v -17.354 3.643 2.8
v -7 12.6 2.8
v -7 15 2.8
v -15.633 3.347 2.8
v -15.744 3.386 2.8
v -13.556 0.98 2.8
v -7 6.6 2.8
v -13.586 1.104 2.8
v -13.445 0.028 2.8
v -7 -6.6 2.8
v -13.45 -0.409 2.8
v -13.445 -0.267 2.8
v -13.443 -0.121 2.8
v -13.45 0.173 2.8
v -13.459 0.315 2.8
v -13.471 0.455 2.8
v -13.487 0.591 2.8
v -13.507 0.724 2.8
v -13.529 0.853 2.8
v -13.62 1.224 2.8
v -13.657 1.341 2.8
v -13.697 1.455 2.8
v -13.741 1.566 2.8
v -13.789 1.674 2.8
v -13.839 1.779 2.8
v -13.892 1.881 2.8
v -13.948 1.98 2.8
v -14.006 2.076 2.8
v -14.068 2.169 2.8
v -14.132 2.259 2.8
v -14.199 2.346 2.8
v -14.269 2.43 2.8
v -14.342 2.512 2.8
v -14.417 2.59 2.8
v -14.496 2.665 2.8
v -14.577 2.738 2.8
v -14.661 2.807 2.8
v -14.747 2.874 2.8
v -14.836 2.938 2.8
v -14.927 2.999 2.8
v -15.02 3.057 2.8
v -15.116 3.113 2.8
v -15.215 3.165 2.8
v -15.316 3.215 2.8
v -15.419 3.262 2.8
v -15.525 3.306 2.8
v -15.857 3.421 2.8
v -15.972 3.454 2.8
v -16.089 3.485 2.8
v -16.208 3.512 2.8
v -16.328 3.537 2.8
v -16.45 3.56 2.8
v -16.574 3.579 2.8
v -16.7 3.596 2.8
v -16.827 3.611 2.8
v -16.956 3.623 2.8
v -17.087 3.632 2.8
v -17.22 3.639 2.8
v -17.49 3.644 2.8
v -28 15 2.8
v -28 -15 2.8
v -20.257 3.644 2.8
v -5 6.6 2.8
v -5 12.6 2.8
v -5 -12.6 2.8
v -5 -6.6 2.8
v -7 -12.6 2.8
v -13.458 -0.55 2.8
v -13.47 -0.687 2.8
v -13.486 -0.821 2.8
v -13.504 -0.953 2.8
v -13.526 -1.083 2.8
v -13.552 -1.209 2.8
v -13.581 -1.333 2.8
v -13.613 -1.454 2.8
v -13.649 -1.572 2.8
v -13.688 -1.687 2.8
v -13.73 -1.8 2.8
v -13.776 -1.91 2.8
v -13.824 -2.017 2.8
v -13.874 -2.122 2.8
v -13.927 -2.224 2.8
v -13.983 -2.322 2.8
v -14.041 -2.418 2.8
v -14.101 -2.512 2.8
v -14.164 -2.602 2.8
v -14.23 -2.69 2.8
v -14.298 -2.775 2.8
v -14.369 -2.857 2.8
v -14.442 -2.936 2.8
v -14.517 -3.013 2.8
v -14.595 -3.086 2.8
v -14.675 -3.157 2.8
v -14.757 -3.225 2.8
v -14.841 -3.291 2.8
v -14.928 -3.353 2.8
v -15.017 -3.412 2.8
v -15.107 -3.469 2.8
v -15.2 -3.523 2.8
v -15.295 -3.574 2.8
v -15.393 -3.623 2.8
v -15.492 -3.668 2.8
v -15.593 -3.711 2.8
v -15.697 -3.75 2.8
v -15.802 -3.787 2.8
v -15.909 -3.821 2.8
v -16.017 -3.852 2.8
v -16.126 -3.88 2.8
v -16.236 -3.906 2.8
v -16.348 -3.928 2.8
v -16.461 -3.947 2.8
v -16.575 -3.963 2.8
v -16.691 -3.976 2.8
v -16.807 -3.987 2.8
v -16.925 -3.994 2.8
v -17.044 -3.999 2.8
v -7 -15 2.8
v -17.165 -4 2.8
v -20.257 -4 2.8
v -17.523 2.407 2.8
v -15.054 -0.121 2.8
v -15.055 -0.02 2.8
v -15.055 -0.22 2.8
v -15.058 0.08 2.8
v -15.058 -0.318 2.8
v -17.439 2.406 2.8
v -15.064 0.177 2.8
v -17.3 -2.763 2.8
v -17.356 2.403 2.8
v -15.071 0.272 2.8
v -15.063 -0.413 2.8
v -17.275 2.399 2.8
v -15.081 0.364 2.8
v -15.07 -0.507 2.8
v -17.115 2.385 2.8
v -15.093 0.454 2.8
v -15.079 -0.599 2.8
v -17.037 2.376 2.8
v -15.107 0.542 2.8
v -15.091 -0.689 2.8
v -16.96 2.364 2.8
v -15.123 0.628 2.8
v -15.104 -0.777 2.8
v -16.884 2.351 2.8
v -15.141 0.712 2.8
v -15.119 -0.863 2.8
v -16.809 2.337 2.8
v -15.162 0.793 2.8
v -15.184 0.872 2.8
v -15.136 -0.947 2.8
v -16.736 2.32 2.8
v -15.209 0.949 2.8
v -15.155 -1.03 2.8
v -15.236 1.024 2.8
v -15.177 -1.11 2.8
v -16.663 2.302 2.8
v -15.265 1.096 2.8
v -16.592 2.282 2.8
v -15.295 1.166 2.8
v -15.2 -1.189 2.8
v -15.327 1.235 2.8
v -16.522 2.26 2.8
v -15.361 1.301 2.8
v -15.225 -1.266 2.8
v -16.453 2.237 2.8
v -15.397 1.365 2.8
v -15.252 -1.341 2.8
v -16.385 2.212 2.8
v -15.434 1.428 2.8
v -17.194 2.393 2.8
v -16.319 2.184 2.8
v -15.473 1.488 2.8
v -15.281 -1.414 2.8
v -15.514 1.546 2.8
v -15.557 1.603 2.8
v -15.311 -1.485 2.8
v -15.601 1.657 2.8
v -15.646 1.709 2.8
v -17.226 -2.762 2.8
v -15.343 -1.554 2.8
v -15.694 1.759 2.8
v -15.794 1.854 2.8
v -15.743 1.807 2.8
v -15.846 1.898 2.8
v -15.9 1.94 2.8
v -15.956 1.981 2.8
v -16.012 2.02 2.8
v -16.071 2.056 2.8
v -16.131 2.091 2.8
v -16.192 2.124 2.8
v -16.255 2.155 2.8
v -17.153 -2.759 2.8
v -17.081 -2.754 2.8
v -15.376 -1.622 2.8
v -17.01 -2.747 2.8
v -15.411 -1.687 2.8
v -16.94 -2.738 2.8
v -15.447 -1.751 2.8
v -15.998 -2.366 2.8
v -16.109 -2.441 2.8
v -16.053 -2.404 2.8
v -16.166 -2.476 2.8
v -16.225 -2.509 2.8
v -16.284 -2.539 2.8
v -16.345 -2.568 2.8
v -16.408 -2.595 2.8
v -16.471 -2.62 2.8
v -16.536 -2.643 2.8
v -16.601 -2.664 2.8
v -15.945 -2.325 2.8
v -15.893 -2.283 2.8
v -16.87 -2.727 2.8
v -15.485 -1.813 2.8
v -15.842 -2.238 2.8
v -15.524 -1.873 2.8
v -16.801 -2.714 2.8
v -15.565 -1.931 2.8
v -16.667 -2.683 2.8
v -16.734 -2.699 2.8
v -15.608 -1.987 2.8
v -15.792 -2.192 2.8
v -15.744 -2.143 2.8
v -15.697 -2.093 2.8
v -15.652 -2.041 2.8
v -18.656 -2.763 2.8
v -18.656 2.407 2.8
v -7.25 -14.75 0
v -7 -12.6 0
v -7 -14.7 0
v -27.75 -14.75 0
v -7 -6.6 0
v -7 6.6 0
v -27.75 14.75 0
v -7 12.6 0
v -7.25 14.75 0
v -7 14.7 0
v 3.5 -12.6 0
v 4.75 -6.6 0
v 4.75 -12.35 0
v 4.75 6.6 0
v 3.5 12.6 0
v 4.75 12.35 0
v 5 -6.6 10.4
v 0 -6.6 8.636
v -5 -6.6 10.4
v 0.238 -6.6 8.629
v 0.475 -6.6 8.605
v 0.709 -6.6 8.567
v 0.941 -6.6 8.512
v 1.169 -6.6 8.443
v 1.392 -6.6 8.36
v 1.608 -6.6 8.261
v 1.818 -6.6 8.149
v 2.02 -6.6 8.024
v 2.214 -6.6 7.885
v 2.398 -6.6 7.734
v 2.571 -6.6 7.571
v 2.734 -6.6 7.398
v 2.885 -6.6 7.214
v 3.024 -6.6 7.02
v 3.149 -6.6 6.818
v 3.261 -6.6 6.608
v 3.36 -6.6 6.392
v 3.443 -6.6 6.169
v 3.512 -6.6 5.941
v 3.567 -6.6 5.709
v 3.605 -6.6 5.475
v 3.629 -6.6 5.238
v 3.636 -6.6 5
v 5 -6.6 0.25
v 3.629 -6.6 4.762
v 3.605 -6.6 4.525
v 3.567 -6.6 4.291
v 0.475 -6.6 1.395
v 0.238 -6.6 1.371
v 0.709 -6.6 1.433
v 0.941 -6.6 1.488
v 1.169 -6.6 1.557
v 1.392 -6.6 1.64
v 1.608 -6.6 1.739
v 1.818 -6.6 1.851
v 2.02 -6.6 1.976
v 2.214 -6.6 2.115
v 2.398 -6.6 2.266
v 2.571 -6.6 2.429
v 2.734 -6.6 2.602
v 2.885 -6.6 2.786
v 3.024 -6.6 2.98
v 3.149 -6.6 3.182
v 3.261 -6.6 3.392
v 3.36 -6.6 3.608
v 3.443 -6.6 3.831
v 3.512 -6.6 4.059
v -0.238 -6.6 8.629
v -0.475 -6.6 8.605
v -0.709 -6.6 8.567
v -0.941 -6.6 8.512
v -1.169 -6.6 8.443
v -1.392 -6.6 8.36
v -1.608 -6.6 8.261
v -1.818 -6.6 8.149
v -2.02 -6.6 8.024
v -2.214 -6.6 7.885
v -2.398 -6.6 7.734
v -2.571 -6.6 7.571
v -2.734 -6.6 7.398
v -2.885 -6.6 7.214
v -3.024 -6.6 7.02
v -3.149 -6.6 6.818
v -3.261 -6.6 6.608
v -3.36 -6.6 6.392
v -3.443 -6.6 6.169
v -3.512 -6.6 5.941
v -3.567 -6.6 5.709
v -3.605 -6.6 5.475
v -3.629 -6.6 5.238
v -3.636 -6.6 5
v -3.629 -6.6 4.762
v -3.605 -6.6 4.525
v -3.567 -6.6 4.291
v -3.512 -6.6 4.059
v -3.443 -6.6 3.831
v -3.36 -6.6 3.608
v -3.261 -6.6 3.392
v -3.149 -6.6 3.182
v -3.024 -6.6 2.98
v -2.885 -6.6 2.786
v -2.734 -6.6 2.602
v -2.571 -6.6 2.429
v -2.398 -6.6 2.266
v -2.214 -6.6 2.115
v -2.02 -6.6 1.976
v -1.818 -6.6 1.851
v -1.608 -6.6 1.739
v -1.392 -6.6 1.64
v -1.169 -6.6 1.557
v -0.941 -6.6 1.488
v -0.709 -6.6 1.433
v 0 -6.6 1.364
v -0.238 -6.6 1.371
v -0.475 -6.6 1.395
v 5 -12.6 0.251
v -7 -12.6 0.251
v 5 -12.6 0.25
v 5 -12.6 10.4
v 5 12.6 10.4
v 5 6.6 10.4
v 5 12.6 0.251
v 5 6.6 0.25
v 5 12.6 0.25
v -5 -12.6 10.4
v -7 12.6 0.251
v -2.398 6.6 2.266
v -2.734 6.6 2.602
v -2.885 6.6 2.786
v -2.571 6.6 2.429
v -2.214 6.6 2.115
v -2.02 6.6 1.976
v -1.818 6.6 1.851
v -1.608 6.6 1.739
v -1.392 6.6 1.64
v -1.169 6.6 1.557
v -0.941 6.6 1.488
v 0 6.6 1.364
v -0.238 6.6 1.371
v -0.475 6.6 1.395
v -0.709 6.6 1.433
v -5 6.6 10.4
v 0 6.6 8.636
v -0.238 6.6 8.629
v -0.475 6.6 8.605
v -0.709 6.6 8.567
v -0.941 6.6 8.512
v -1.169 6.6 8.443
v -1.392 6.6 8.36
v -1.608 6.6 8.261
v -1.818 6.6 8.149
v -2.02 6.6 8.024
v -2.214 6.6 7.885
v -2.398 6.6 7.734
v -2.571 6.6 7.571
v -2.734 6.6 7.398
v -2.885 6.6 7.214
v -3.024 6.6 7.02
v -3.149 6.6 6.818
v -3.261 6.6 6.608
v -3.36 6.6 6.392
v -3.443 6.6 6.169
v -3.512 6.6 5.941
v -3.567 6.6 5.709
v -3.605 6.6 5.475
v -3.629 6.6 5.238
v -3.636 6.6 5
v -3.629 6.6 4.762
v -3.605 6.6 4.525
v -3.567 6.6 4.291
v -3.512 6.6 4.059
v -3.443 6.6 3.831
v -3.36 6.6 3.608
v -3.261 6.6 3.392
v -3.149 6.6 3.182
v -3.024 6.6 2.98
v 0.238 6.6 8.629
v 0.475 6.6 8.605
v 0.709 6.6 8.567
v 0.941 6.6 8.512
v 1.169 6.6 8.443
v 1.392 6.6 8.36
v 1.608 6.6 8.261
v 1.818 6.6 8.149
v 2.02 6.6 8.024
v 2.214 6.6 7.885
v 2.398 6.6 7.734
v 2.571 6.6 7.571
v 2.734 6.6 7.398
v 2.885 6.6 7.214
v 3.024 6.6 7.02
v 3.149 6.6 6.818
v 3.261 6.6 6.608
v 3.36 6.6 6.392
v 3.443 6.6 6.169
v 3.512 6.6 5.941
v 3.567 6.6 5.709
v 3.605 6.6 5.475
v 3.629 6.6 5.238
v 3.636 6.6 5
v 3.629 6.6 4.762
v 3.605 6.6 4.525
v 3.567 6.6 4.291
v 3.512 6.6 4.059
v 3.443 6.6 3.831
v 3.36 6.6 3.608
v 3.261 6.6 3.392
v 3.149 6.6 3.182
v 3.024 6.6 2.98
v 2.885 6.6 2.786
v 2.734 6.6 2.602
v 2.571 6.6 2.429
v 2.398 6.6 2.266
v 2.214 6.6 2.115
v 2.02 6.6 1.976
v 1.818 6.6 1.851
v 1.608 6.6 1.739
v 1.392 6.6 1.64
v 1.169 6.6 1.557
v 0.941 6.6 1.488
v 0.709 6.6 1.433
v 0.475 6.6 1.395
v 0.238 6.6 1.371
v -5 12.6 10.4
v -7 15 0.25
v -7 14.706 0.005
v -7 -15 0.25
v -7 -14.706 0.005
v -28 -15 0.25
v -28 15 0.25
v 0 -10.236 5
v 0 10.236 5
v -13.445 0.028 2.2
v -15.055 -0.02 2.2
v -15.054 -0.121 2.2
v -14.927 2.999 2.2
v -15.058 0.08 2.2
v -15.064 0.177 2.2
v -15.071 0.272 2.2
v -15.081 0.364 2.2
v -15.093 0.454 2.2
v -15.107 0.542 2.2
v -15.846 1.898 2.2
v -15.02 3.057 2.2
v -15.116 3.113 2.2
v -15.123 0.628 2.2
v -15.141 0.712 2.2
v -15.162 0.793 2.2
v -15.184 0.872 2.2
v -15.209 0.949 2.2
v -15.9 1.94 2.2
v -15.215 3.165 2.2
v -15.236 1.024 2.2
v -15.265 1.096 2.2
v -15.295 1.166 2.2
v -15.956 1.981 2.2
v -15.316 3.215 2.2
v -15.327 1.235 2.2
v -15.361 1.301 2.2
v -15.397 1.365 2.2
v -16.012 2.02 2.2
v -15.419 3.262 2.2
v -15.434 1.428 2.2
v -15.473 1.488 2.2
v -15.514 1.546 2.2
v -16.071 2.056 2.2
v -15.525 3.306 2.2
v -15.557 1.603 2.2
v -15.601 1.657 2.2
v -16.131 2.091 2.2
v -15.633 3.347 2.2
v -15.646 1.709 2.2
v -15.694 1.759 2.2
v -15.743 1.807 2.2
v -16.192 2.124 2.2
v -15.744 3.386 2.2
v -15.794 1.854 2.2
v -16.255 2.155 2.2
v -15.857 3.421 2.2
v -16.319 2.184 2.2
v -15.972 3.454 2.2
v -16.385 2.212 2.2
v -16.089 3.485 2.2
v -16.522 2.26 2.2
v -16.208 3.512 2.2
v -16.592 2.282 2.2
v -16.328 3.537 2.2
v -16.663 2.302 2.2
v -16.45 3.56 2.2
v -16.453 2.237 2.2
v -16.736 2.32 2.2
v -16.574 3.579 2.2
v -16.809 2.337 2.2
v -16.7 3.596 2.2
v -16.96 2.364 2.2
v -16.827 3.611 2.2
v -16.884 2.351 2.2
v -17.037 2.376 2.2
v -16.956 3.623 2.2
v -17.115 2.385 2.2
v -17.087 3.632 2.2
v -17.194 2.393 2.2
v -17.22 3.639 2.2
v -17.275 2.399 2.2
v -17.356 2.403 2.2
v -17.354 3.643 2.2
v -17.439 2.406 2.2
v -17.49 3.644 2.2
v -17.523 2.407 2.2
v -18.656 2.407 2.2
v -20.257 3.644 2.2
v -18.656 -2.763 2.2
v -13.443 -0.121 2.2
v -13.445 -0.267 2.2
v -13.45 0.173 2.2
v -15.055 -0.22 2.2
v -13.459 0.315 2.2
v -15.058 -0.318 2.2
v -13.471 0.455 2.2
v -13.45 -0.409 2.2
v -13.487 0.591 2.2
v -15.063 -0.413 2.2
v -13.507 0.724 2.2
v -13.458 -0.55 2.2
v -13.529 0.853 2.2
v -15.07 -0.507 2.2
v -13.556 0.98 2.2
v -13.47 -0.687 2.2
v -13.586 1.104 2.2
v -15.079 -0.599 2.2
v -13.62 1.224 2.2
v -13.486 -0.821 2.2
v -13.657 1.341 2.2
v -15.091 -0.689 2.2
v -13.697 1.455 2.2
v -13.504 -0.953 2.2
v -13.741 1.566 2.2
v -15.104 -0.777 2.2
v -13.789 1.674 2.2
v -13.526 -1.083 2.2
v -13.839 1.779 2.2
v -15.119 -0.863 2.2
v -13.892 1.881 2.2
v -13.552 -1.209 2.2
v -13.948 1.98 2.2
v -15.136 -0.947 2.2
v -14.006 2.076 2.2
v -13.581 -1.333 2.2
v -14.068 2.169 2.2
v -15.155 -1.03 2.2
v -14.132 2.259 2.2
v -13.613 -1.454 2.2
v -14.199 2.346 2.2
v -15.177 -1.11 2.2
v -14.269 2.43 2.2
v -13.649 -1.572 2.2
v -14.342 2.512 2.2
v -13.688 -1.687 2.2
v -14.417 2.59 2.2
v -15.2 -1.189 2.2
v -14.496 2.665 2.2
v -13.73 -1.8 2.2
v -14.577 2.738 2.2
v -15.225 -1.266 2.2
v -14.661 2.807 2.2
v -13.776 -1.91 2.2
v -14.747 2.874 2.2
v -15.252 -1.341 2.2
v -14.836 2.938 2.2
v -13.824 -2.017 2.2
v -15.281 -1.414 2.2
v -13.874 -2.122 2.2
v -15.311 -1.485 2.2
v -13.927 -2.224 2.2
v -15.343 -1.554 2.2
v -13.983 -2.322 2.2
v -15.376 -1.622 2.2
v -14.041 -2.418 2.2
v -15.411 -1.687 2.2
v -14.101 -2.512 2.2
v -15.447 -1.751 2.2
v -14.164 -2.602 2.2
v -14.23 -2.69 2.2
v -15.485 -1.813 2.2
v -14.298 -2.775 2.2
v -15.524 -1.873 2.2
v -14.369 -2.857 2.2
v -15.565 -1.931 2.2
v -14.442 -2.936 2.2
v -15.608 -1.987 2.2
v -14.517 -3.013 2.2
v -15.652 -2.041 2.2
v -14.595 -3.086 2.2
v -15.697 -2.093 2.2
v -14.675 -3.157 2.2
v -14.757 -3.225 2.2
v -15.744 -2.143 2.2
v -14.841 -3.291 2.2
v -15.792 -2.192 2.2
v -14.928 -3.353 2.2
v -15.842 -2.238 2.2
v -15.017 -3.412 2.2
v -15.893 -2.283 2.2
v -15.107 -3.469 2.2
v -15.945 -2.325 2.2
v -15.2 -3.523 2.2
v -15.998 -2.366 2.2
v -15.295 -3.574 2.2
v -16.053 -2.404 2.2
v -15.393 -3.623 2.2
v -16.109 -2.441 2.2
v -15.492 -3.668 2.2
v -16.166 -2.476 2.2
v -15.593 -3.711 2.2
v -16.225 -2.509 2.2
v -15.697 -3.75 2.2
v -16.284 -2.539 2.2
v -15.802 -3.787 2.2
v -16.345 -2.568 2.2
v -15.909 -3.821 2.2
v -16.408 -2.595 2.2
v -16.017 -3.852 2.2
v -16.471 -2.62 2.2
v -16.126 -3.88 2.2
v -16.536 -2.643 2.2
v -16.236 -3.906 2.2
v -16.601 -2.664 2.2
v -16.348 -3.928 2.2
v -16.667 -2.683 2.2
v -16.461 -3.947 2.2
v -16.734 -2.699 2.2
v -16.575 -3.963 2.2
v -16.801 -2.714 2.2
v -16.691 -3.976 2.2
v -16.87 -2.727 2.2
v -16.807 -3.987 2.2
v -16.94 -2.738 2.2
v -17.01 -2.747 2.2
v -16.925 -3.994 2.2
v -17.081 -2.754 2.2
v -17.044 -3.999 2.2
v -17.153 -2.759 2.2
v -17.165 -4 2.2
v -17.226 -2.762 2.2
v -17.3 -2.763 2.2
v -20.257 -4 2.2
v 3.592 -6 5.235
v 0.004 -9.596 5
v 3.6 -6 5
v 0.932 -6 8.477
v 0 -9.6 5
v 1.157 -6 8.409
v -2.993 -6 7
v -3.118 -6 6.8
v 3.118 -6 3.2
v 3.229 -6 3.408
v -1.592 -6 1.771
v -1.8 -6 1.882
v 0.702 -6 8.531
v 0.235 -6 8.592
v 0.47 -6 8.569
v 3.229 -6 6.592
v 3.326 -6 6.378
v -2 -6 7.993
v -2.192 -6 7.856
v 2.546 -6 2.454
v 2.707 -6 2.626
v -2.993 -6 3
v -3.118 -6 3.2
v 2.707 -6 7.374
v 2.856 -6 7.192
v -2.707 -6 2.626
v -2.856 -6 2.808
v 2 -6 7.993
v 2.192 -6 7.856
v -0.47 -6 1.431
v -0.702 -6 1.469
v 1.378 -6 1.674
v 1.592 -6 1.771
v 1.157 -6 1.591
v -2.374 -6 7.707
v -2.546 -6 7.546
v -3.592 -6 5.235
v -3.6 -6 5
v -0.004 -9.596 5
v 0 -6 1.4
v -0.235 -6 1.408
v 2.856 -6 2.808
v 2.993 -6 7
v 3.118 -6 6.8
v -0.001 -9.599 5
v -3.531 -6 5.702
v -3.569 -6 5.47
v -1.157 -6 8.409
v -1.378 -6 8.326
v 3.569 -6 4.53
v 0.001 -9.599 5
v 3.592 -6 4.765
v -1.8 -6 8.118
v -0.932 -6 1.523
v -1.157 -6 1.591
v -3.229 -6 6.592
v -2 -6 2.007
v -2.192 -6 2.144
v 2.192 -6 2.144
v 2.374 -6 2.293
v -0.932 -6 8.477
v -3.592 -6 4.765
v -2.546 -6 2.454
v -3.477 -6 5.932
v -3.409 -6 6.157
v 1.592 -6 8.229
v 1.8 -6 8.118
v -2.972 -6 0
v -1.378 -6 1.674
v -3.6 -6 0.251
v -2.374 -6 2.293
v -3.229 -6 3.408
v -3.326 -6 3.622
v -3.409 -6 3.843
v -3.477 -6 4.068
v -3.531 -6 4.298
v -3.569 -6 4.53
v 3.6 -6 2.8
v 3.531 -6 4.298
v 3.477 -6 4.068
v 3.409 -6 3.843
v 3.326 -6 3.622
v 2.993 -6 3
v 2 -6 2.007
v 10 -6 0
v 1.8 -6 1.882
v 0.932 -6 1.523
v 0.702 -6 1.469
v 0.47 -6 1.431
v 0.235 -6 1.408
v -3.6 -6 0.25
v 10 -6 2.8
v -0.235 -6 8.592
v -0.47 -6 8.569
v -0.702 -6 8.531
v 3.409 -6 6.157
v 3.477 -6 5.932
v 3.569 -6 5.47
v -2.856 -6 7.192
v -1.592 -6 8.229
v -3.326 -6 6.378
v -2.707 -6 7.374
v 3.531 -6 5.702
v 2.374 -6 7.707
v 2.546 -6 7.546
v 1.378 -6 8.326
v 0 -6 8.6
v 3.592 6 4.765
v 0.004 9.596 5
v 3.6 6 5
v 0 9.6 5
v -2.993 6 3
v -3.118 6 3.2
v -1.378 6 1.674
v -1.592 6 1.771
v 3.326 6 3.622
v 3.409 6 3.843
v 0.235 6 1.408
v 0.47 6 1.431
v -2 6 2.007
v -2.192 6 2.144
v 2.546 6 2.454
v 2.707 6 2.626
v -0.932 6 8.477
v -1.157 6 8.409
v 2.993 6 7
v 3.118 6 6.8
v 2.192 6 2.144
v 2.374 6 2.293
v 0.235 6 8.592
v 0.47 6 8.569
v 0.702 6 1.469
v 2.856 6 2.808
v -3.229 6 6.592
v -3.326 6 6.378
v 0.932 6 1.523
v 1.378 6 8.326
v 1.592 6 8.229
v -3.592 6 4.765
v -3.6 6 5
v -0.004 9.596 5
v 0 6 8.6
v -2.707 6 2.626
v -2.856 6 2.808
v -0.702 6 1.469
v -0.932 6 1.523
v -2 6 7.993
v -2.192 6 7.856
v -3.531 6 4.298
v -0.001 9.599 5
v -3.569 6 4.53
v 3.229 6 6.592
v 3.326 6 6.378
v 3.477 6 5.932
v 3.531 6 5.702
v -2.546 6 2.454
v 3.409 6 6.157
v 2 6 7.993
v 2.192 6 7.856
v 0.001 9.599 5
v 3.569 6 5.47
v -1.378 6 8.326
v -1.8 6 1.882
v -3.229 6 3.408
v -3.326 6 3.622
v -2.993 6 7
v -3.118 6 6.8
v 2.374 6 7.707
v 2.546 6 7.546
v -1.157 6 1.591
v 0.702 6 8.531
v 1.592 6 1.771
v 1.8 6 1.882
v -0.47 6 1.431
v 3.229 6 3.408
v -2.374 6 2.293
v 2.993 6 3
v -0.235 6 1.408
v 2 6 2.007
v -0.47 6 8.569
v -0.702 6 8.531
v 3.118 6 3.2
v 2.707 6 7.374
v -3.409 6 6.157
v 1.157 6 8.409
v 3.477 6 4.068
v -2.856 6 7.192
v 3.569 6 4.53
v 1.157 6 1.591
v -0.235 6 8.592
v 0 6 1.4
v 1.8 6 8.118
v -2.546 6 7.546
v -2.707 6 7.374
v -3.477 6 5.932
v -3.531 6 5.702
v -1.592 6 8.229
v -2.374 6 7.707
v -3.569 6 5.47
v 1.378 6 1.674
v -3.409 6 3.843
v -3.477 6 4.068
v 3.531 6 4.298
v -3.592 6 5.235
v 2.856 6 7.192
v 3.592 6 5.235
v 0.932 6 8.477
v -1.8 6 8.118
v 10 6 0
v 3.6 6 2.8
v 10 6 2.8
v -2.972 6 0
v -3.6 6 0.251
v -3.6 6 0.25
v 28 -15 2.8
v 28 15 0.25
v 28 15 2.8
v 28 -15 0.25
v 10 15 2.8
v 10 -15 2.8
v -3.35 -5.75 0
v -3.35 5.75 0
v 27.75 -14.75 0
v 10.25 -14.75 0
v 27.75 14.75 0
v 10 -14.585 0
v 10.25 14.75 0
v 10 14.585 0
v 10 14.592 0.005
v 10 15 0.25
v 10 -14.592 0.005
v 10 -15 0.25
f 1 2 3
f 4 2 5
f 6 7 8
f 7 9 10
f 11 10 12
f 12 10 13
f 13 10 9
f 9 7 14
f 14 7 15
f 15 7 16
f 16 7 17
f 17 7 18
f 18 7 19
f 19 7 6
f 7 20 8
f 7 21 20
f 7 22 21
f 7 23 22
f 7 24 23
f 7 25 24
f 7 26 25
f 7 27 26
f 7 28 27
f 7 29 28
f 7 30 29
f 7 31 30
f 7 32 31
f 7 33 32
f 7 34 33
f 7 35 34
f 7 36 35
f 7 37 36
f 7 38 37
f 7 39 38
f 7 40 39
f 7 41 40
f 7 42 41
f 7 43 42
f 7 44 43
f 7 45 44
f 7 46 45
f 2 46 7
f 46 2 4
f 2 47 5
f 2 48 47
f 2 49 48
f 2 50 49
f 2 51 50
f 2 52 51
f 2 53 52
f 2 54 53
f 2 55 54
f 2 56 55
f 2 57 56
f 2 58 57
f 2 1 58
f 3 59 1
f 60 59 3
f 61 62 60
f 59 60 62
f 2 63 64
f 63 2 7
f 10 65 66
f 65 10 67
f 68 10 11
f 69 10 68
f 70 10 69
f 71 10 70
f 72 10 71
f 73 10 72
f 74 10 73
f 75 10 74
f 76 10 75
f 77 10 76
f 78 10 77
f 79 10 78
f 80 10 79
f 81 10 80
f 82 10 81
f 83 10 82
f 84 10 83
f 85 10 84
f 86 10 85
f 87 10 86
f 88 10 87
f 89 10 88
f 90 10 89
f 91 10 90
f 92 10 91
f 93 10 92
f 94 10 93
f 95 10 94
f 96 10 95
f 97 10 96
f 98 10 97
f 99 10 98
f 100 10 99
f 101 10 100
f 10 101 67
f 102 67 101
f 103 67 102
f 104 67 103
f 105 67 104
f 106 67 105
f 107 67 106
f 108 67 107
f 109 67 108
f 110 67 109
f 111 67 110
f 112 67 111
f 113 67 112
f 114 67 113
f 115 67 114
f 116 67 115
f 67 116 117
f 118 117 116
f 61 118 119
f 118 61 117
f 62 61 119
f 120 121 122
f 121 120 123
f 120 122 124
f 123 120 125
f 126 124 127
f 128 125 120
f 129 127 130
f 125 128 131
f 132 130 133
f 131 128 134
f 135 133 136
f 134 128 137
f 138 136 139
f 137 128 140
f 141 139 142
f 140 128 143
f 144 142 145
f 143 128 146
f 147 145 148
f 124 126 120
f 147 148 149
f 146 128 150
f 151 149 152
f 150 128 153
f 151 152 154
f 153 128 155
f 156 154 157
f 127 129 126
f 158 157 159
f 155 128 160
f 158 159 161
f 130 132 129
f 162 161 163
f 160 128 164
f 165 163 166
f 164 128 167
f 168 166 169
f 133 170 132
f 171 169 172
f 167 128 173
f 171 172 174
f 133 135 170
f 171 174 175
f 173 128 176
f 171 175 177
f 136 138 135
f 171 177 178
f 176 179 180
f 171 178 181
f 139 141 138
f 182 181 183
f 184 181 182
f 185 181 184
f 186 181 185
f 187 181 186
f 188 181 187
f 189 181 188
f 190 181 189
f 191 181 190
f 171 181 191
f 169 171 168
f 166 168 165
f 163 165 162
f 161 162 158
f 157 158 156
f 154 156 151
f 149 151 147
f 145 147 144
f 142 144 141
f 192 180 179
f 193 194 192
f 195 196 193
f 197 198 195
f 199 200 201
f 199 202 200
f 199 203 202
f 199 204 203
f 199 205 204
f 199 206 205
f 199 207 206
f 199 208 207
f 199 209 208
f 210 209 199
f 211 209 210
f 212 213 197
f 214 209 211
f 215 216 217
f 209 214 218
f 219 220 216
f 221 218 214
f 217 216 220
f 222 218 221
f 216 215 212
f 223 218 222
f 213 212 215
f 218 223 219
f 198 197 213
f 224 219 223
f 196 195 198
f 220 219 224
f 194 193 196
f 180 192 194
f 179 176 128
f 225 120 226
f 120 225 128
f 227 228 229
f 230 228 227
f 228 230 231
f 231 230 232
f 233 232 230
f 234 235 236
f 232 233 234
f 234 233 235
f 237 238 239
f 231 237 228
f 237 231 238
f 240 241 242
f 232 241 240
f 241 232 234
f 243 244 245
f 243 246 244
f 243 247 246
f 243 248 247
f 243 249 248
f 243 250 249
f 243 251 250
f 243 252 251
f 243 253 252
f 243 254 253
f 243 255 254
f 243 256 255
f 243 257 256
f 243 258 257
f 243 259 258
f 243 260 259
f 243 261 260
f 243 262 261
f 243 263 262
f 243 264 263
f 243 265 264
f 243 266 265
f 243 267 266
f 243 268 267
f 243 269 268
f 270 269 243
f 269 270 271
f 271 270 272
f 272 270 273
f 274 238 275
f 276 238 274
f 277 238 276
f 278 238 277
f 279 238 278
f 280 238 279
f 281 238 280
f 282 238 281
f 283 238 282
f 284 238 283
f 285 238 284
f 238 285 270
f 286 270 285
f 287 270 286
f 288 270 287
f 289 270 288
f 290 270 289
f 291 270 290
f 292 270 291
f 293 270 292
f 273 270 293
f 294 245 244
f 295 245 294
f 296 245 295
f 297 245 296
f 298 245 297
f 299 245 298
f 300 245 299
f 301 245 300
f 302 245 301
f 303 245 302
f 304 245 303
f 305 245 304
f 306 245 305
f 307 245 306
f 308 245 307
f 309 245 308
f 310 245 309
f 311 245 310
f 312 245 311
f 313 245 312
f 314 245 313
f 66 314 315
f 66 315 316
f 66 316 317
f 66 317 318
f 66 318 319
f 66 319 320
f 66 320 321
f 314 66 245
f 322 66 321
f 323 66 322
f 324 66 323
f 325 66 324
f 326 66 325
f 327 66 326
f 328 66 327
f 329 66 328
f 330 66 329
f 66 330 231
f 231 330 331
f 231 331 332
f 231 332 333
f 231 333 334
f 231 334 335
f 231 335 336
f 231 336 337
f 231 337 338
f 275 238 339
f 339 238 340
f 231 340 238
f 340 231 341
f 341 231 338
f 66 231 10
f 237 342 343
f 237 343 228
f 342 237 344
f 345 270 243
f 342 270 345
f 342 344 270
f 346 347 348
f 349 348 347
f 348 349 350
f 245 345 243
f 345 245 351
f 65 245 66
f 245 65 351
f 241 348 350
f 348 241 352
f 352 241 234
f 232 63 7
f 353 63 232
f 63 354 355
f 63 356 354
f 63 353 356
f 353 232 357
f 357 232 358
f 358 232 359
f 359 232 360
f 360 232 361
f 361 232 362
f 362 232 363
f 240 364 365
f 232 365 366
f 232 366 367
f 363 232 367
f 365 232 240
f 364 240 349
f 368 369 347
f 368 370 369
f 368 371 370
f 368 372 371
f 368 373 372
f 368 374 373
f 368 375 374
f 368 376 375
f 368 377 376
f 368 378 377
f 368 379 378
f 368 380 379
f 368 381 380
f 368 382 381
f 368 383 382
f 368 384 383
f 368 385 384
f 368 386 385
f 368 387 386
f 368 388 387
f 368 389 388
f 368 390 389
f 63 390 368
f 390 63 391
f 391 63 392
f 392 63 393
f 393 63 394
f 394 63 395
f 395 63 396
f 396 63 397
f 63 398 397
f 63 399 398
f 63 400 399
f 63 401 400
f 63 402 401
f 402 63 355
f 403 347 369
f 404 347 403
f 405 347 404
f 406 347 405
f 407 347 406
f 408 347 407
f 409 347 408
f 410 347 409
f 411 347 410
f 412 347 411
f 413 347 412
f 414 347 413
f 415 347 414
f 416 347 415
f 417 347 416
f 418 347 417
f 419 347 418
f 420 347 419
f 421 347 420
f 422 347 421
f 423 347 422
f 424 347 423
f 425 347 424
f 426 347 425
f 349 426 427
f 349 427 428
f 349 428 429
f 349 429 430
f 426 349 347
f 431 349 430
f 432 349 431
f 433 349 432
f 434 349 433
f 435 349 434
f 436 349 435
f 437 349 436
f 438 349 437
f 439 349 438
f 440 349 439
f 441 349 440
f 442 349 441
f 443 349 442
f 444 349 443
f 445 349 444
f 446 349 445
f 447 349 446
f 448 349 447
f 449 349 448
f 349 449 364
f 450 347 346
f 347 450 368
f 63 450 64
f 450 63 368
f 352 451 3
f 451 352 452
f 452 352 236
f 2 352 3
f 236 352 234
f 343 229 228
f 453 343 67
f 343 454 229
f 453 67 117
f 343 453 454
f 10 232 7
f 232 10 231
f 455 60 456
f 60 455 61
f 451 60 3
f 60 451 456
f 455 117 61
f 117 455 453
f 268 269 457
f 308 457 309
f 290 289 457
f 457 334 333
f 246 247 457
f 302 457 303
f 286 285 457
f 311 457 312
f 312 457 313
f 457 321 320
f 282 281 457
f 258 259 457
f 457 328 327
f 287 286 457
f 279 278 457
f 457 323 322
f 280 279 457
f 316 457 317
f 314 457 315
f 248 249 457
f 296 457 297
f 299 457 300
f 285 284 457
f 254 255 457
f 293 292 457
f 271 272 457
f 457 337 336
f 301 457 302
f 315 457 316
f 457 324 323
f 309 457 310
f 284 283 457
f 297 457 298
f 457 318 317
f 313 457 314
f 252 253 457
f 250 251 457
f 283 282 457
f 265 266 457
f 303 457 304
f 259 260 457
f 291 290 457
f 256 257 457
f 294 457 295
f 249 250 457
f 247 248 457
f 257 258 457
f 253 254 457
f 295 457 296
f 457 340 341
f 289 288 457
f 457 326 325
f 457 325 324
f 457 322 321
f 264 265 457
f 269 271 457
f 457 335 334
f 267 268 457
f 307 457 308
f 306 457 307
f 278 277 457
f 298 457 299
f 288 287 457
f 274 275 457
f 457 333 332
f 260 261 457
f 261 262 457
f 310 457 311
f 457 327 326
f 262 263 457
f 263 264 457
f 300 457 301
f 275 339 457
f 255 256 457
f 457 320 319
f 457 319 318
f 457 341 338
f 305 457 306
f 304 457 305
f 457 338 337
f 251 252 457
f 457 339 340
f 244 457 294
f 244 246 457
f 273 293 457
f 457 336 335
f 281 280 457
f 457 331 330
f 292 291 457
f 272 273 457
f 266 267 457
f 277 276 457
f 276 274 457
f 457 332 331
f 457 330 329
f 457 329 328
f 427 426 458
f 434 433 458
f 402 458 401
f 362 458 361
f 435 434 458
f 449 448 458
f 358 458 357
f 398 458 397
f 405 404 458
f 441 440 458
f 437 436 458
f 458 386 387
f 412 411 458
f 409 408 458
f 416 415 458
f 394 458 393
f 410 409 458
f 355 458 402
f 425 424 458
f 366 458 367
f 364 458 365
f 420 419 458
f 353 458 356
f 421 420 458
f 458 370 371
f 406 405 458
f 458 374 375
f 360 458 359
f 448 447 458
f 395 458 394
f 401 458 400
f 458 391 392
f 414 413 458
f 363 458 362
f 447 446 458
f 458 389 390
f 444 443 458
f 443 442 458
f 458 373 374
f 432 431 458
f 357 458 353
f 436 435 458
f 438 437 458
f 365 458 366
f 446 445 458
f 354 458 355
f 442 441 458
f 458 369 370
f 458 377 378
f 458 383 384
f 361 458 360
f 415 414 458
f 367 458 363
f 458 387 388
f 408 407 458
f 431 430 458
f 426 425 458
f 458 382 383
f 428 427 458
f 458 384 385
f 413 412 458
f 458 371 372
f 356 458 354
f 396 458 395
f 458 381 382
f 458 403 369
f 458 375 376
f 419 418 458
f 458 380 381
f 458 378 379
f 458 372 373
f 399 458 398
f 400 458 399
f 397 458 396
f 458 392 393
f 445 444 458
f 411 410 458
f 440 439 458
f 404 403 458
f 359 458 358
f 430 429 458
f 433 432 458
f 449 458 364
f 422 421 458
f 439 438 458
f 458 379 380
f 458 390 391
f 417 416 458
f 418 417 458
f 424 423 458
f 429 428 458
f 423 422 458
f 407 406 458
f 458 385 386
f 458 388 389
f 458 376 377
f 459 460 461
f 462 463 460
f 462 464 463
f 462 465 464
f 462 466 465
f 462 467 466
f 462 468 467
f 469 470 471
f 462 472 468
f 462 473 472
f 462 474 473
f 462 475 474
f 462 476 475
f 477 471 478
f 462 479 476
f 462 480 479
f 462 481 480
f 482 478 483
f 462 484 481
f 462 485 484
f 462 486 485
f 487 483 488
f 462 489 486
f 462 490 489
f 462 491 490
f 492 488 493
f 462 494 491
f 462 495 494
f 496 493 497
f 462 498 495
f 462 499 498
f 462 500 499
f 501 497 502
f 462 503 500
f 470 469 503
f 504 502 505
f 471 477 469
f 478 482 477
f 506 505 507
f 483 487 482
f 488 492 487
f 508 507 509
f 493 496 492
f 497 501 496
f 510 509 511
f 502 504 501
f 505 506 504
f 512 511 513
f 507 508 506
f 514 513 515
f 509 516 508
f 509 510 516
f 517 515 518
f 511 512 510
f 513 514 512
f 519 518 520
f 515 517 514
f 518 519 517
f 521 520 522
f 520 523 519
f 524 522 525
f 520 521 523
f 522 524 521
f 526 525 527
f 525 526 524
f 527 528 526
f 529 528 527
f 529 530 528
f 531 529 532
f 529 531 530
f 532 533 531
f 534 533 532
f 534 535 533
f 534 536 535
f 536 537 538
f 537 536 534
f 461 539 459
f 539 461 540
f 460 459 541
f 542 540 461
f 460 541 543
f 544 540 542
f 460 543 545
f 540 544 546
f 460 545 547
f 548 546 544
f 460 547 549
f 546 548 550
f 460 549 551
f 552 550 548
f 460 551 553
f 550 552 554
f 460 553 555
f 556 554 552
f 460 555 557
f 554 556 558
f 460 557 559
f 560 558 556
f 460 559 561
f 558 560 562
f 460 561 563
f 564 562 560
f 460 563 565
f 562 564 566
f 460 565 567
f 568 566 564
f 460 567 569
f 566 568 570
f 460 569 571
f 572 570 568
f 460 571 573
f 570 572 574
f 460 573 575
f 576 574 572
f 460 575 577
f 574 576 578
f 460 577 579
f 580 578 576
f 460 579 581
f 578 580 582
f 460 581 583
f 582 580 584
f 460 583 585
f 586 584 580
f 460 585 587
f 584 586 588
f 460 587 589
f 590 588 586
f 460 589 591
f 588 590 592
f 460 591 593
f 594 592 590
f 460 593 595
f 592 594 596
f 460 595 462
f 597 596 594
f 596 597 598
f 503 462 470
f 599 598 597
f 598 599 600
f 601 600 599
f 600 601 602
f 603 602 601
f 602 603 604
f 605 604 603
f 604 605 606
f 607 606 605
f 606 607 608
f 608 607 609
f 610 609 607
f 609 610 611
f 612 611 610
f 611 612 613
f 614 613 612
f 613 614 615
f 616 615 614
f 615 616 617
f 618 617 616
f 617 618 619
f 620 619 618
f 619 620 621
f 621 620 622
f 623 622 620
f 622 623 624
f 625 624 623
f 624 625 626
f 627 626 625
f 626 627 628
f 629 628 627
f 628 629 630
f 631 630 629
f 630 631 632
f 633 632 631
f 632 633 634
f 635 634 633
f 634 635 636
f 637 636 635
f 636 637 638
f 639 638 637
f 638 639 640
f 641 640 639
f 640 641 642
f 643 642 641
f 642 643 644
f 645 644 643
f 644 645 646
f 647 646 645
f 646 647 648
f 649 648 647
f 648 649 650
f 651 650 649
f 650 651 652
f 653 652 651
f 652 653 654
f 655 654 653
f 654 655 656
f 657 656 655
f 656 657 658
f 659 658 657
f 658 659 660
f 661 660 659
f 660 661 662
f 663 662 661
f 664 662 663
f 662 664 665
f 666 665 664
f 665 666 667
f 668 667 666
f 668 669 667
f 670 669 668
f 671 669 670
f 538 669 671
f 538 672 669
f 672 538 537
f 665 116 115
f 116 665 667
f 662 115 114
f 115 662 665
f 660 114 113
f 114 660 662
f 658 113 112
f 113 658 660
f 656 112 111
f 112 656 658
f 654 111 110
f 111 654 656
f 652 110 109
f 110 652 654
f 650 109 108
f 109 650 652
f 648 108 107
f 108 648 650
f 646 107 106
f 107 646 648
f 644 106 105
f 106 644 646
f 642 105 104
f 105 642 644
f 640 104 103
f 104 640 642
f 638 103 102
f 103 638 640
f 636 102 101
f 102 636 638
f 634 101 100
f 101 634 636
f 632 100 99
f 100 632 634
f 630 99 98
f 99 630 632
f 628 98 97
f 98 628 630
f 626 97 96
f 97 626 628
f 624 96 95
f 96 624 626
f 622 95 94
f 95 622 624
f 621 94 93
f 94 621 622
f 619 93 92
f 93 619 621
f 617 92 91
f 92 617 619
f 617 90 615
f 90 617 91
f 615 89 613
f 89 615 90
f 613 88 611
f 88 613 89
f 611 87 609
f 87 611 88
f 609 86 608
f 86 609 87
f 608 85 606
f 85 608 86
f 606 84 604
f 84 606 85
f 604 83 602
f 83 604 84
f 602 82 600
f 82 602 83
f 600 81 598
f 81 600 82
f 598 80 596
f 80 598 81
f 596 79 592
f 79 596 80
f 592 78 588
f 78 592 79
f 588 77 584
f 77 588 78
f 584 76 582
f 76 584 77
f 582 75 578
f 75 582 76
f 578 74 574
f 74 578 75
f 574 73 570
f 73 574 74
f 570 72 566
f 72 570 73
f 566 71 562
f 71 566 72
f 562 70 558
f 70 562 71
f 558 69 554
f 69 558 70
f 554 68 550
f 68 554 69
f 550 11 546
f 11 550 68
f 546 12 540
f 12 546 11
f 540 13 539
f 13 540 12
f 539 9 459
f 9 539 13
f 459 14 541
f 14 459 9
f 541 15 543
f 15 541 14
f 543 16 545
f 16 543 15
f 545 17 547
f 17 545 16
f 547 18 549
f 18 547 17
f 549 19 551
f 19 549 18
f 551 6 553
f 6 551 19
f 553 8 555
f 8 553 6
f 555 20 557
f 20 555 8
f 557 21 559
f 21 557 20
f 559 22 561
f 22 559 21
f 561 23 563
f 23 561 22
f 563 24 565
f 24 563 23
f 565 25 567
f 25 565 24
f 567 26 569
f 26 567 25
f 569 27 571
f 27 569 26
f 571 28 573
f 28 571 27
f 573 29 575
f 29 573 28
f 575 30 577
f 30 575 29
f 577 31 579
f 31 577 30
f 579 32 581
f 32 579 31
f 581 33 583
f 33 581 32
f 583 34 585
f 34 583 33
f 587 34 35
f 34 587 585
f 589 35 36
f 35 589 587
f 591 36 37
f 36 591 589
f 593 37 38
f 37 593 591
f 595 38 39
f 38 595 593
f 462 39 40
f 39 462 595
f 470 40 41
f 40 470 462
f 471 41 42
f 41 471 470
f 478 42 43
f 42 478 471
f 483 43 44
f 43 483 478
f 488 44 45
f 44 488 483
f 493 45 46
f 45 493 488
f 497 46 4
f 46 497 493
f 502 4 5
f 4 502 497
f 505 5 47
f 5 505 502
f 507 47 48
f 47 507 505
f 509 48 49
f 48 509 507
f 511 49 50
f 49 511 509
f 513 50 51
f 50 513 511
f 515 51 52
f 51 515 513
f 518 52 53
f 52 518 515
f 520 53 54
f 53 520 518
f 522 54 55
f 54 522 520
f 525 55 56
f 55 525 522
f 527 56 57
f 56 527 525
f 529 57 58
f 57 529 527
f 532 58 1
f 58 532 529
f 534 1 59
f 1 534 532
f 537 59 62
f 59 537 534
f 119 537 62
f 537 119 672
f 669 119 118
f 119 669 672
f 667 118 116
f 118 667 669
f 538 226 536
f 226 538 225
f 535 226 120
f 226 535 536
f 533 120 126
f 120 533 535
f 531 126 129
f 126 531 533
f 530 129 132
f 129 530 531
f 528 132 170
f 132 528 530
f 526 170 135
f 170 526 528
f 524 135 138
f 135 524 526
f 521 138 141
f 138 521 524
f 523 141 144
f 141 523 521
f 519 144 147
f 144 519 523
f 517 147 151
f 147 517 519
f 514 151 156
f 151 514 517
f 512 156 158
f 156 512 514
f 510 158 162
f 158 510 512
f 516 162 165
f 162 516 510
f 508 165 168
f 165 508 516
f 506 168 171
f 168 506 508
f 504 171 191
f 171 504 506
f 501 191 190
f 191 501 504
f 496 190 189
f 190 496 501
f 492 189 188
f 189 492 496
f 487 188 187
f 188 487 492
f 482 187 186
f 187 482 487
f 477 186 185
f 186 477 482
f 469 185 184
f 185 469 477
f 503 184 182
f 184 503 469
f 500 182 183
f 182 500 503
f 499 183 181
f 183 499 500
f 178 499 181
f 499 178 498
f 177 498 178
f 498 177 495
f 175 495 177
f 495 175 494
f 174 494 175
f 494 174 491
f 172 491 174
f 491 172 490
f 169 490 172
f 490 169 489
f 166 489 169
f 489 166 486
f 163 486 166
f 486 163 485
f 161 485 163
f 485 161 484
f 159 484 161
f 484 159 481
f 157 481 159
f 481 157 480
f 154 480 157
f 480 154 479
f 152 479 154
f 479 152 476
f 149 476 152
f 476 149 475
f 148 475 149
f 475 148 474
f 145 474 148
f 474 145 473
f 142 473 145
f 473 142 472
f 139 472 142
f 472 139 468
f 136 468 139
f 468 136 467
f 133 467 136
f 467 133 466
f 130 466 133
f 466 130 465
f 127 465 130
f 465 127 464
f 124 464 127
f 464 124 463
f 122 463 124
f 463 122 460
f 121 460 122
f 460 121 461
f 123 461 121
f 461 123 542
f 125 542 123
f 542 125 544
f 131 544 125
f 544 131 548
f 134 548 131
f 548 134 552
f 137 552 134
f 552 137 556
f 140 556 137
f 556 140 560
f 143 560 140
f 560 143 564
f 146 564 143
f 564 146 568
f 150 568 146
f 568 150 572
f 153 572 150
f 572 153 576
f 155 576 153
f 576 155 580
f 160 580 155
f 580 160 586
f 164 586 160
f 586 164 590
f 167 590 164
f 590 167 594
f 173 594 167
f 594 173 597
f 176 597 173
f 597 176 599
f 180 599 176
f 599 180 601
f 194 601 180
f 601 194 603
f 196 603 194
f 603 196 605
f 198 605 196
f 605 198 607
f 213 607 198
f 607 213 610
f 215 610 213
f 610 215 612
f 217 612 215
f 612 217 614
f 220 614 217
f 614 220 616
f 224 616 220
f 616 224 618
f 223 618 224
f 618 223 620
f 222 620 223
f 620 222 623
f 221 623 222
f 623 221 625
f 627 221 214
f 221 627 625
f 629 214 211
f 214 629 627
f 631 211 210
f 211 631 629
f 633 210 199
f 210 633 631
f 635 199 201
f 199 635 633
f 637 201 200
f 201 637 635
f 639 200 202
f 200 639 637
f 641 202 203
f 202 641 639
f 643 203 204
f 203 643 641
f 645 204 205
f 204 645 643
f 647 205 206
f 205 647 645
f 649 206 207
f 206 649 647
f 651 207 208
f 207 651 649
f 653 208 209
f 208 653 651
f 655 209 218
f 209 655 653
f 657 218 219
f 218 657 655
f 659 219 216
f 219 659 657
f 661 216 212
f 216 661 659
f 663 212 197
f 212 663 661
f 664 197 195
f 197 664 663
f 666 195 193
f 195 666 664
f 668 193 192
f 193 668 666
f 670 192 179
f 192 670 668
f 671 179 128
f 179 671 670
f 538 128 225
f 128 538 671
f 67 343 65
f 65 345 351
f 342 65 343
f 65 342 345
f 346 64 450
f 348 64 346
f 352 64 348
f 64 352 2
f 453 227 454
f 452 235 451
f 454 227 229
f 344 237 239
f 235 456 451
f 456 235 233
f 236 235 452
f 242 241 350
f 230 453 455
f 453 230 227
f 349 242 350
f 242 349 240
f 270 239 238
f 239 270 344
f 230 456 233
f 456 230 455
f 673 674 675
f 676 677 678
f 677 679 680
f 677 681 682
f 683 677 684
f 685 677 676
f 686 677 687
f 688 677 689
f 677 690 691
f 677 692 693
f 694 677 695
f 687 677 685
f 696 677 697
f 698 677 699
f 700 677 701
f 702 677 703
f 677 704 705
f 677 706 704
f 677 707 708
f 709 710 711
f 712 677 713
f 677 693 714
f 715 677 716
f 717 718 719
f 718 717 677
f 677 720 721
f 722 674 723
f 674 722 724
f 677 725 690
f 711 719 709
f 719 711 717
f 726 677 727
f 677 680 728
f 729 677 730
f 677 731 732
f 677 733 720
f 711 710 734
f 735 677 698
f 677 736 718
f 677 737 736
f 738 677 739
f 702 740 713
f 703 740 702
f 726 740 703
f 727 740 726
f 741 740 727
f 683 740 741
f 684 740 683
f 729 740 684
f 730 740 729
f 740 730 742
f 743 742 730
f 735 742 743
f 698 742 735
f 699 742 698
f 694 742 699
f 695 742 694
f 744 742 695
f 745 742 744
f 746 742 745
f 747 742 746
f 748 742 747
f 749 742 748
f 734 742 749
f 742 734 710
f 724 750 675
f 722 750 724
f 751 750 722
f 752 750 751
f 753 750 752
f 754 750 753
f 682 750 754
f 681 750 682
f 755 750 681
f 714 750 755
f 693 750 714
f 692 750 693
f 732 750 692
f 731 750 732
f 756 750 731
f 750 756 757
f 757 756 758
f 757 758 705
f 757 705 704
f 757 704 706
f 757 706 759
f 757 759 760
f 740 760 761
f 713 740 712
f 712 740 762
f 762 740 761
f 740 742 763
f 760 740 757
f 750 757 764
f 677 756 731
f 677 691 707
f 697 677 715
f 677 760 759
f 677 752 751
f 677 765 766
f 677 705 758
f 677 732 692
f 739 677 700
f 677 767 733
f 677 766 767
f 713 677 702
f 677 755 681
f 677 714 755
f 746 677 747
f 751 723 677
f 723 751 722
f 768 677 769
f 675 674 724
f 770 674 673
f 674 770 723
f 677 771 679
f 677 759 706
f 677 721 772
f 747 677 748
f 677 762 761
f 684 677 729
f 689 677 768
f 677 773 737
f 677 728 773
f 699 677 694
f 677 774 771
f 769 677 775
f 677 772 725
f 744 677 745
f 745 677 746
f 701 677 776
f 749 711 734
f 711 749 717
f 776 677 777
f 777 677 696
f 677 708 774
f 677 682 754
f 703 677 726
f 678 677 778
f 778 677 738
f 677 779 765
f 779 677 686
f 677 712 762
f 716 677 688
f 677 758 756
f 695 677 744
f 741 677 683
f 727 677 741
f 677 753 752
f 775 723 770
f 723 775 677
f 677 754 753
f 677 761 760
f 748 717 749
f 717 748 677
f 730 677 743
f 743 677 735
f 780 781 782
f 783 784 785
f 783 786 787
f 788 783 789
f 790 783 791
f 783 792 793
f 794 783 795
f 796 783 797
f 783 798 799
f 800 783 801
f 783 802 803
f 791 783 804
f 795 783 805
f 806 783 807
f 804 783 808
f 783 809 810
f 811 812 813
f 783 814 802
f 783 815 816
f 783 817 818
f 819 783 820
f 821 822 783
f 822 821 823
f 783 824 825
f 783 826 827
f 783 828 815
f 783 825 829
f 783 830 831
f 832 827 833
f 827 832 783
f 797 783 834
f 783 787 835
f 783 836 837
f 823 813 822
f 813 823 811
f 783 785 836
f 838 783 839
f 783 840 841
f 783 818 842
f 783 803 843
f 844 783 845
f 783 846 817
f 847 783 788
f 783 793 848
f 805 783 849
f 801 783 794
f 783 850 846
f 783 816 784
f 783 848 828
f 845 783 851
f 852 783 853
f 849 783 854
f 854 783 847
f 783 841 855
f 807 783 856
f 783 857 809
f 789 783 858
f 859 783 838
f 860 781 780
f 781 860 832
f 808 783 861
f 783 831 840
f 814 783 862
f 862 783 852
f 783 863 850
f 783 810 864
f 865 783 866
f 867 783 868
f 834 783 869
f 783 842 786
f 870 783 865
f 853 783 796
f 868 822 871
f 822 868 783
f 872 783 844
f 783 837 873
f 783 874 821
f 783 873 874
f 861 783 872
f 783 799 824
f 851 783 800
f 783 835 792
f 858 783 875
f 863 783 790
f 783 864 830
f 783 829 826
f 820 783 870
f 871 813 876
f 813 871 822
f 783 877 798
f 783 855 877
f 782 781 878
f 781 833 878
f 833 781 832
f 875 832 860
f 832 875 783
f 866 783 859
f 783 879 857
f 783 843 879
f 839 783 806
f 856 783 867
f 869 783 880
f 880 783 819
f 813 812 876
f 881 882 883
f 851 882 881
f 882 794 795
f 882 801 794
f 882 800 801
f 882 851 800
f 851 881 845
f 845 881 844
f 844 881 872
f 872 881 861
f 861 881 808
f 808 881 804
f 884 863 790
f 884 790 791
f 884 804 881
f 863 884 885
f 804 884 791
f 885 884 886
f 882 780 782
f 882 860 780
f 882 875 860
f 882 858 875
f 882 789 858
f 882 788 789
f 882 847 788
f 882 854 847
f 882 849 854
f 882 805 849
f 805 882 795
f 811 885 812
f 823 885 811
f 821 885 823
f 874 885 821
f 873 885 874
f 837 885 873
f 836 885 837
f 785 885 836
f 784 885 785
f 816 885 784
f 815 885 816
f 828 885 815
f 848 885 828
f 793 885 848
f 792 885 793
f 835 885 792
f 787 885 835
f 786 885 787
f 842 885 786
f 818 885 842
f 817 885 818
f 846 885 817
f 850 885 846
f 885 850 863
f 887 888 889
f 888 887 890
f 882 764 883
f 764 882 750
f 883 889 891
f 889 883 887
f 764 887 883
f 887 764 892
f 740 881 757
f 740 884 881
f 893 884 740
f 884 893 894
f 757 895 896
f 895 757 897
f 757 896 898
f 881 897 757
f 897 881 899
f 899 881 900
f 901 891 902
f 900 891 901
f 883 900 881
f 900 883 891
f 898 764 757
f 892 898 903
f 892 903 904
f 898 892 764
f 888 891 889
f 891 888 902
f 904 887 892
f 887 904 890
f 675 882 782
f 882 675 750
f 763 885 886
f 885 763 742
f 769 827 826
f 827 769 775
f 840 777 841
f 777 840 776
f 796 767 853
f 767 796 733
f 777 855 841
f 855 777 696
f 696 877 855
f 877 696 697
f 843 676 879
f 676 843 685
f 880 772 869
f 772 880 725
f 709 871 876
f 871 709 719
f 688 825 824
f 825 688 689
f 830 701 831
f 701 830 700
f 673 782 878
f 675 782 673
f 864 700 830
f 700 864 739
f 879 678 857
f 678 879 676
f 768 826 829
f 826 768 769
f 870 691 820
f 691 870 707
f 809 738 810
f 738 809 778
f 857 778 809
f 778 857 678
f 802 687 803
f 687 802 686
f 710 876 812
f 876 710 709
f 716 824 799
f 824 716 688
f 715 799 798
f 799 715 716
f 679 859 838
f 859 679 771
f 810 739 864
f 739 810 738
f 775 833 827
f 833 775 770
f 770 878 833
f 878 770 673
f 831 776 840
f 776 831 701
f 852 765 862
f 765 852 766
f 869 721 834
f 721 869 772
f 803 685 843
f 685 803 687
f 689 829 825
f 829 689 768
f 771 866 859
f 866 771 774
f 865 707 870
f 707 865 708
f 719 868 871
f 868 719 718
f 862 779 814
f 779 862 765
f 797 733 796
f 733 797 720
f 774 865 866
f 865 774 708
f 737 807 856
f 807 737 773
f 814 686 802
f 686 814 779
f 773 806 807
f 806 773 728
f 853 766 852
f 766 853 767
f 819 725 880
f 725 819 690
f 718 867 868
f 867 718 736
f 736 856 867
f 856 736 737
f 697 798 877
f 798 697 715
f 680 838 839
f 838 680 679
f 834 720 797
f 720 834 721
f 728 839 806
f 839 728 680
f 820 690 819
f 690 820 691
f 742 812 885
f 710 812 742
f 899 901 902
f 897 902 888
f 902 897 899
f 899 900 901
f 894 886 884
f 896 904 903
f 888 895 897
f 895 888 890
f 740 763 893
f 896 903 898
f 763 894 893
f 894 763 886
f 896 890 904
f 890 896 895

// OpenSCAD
// D: Outward-cone blind-socket hinge coupon. Units mm.
// Print assembled at Z=0. Separate exports are inspection only, no assembly.
// 180 degree upward fold: rotate right about Y by -180 around Z=5.
part="assembly"; // assembly,left,right
$fn=96;
axis_z=5;
r=3.6;
normal_gap=0.45;
end_gap=0.60;
plate_t=2.8;
module box(a,b){translate(a) cube(b-a);}
// Two local pointed conical bearings, no through pin.
module cones(clear=0){
 for(s=[-1,1]) translate([0,s*6,axis_z]) rotate([-90*s,0,0])
 cylinder(h=r+clear*sqrt(2),r1=r+clear*sqrt(2),r2=0);
}
module left_raw(){
 difference(){
 union(){
 box([-28,-15,0],[-7,15,plate_t]);
 for(s=[-1,1]){
  y0=s<0?-12.6:6+end_gap;
  y1=s<0?-6-end_gap:12.6;
  box([-10,y0,0],[0,y1,plate_t]);
  box([-5,y0,0],[5,y1,10.4]);
 }
 }
 cones(normal_gap);
 // Wide engraved label, 0.6 mm deep, away from bearing.
 translate([-21,-4,plate_t-0.6]) linear_extrude(0.8)
 text("D",size=8,font="Liberation Sans:style=Bold");
 }
}
module right_raw(){
 union(){
 box([10,-15,0],[28,15,plate_t]);
 box([0,-6,0],[12,6,plate_t]);
 box([-r,-6,0],[r,6,axis_z]);
 translate([0,-6,axis_z]) rotate([-90,0,0]) cylinder(h=12,r=r);
 cones();
 }
}
// 0.25 mm bottom edge relief reduces elephant-foot sensitivity.
module bed_relief(){
 intersection(){
 children();
 union(){
 translate([0,0,0.25]) linear_extrude(20) projection() children();
 hull(){
 linear_extrude(0.001) offset(delta=-0.25) projection(cut=true) translate([0,0,-0.01]) children();
 translate([0,0,0.25]) linear_extrude(0.001) projection(cut=true) translate([0,0,-0.26]) children();
 }
 }
 }
}
module left(){bed_relief() left_raw();}
module right(){bed_relief() right_raw();}
if(part=="assembly"){left();right();}
if(part=="left") left();
if(part=="right") right();
